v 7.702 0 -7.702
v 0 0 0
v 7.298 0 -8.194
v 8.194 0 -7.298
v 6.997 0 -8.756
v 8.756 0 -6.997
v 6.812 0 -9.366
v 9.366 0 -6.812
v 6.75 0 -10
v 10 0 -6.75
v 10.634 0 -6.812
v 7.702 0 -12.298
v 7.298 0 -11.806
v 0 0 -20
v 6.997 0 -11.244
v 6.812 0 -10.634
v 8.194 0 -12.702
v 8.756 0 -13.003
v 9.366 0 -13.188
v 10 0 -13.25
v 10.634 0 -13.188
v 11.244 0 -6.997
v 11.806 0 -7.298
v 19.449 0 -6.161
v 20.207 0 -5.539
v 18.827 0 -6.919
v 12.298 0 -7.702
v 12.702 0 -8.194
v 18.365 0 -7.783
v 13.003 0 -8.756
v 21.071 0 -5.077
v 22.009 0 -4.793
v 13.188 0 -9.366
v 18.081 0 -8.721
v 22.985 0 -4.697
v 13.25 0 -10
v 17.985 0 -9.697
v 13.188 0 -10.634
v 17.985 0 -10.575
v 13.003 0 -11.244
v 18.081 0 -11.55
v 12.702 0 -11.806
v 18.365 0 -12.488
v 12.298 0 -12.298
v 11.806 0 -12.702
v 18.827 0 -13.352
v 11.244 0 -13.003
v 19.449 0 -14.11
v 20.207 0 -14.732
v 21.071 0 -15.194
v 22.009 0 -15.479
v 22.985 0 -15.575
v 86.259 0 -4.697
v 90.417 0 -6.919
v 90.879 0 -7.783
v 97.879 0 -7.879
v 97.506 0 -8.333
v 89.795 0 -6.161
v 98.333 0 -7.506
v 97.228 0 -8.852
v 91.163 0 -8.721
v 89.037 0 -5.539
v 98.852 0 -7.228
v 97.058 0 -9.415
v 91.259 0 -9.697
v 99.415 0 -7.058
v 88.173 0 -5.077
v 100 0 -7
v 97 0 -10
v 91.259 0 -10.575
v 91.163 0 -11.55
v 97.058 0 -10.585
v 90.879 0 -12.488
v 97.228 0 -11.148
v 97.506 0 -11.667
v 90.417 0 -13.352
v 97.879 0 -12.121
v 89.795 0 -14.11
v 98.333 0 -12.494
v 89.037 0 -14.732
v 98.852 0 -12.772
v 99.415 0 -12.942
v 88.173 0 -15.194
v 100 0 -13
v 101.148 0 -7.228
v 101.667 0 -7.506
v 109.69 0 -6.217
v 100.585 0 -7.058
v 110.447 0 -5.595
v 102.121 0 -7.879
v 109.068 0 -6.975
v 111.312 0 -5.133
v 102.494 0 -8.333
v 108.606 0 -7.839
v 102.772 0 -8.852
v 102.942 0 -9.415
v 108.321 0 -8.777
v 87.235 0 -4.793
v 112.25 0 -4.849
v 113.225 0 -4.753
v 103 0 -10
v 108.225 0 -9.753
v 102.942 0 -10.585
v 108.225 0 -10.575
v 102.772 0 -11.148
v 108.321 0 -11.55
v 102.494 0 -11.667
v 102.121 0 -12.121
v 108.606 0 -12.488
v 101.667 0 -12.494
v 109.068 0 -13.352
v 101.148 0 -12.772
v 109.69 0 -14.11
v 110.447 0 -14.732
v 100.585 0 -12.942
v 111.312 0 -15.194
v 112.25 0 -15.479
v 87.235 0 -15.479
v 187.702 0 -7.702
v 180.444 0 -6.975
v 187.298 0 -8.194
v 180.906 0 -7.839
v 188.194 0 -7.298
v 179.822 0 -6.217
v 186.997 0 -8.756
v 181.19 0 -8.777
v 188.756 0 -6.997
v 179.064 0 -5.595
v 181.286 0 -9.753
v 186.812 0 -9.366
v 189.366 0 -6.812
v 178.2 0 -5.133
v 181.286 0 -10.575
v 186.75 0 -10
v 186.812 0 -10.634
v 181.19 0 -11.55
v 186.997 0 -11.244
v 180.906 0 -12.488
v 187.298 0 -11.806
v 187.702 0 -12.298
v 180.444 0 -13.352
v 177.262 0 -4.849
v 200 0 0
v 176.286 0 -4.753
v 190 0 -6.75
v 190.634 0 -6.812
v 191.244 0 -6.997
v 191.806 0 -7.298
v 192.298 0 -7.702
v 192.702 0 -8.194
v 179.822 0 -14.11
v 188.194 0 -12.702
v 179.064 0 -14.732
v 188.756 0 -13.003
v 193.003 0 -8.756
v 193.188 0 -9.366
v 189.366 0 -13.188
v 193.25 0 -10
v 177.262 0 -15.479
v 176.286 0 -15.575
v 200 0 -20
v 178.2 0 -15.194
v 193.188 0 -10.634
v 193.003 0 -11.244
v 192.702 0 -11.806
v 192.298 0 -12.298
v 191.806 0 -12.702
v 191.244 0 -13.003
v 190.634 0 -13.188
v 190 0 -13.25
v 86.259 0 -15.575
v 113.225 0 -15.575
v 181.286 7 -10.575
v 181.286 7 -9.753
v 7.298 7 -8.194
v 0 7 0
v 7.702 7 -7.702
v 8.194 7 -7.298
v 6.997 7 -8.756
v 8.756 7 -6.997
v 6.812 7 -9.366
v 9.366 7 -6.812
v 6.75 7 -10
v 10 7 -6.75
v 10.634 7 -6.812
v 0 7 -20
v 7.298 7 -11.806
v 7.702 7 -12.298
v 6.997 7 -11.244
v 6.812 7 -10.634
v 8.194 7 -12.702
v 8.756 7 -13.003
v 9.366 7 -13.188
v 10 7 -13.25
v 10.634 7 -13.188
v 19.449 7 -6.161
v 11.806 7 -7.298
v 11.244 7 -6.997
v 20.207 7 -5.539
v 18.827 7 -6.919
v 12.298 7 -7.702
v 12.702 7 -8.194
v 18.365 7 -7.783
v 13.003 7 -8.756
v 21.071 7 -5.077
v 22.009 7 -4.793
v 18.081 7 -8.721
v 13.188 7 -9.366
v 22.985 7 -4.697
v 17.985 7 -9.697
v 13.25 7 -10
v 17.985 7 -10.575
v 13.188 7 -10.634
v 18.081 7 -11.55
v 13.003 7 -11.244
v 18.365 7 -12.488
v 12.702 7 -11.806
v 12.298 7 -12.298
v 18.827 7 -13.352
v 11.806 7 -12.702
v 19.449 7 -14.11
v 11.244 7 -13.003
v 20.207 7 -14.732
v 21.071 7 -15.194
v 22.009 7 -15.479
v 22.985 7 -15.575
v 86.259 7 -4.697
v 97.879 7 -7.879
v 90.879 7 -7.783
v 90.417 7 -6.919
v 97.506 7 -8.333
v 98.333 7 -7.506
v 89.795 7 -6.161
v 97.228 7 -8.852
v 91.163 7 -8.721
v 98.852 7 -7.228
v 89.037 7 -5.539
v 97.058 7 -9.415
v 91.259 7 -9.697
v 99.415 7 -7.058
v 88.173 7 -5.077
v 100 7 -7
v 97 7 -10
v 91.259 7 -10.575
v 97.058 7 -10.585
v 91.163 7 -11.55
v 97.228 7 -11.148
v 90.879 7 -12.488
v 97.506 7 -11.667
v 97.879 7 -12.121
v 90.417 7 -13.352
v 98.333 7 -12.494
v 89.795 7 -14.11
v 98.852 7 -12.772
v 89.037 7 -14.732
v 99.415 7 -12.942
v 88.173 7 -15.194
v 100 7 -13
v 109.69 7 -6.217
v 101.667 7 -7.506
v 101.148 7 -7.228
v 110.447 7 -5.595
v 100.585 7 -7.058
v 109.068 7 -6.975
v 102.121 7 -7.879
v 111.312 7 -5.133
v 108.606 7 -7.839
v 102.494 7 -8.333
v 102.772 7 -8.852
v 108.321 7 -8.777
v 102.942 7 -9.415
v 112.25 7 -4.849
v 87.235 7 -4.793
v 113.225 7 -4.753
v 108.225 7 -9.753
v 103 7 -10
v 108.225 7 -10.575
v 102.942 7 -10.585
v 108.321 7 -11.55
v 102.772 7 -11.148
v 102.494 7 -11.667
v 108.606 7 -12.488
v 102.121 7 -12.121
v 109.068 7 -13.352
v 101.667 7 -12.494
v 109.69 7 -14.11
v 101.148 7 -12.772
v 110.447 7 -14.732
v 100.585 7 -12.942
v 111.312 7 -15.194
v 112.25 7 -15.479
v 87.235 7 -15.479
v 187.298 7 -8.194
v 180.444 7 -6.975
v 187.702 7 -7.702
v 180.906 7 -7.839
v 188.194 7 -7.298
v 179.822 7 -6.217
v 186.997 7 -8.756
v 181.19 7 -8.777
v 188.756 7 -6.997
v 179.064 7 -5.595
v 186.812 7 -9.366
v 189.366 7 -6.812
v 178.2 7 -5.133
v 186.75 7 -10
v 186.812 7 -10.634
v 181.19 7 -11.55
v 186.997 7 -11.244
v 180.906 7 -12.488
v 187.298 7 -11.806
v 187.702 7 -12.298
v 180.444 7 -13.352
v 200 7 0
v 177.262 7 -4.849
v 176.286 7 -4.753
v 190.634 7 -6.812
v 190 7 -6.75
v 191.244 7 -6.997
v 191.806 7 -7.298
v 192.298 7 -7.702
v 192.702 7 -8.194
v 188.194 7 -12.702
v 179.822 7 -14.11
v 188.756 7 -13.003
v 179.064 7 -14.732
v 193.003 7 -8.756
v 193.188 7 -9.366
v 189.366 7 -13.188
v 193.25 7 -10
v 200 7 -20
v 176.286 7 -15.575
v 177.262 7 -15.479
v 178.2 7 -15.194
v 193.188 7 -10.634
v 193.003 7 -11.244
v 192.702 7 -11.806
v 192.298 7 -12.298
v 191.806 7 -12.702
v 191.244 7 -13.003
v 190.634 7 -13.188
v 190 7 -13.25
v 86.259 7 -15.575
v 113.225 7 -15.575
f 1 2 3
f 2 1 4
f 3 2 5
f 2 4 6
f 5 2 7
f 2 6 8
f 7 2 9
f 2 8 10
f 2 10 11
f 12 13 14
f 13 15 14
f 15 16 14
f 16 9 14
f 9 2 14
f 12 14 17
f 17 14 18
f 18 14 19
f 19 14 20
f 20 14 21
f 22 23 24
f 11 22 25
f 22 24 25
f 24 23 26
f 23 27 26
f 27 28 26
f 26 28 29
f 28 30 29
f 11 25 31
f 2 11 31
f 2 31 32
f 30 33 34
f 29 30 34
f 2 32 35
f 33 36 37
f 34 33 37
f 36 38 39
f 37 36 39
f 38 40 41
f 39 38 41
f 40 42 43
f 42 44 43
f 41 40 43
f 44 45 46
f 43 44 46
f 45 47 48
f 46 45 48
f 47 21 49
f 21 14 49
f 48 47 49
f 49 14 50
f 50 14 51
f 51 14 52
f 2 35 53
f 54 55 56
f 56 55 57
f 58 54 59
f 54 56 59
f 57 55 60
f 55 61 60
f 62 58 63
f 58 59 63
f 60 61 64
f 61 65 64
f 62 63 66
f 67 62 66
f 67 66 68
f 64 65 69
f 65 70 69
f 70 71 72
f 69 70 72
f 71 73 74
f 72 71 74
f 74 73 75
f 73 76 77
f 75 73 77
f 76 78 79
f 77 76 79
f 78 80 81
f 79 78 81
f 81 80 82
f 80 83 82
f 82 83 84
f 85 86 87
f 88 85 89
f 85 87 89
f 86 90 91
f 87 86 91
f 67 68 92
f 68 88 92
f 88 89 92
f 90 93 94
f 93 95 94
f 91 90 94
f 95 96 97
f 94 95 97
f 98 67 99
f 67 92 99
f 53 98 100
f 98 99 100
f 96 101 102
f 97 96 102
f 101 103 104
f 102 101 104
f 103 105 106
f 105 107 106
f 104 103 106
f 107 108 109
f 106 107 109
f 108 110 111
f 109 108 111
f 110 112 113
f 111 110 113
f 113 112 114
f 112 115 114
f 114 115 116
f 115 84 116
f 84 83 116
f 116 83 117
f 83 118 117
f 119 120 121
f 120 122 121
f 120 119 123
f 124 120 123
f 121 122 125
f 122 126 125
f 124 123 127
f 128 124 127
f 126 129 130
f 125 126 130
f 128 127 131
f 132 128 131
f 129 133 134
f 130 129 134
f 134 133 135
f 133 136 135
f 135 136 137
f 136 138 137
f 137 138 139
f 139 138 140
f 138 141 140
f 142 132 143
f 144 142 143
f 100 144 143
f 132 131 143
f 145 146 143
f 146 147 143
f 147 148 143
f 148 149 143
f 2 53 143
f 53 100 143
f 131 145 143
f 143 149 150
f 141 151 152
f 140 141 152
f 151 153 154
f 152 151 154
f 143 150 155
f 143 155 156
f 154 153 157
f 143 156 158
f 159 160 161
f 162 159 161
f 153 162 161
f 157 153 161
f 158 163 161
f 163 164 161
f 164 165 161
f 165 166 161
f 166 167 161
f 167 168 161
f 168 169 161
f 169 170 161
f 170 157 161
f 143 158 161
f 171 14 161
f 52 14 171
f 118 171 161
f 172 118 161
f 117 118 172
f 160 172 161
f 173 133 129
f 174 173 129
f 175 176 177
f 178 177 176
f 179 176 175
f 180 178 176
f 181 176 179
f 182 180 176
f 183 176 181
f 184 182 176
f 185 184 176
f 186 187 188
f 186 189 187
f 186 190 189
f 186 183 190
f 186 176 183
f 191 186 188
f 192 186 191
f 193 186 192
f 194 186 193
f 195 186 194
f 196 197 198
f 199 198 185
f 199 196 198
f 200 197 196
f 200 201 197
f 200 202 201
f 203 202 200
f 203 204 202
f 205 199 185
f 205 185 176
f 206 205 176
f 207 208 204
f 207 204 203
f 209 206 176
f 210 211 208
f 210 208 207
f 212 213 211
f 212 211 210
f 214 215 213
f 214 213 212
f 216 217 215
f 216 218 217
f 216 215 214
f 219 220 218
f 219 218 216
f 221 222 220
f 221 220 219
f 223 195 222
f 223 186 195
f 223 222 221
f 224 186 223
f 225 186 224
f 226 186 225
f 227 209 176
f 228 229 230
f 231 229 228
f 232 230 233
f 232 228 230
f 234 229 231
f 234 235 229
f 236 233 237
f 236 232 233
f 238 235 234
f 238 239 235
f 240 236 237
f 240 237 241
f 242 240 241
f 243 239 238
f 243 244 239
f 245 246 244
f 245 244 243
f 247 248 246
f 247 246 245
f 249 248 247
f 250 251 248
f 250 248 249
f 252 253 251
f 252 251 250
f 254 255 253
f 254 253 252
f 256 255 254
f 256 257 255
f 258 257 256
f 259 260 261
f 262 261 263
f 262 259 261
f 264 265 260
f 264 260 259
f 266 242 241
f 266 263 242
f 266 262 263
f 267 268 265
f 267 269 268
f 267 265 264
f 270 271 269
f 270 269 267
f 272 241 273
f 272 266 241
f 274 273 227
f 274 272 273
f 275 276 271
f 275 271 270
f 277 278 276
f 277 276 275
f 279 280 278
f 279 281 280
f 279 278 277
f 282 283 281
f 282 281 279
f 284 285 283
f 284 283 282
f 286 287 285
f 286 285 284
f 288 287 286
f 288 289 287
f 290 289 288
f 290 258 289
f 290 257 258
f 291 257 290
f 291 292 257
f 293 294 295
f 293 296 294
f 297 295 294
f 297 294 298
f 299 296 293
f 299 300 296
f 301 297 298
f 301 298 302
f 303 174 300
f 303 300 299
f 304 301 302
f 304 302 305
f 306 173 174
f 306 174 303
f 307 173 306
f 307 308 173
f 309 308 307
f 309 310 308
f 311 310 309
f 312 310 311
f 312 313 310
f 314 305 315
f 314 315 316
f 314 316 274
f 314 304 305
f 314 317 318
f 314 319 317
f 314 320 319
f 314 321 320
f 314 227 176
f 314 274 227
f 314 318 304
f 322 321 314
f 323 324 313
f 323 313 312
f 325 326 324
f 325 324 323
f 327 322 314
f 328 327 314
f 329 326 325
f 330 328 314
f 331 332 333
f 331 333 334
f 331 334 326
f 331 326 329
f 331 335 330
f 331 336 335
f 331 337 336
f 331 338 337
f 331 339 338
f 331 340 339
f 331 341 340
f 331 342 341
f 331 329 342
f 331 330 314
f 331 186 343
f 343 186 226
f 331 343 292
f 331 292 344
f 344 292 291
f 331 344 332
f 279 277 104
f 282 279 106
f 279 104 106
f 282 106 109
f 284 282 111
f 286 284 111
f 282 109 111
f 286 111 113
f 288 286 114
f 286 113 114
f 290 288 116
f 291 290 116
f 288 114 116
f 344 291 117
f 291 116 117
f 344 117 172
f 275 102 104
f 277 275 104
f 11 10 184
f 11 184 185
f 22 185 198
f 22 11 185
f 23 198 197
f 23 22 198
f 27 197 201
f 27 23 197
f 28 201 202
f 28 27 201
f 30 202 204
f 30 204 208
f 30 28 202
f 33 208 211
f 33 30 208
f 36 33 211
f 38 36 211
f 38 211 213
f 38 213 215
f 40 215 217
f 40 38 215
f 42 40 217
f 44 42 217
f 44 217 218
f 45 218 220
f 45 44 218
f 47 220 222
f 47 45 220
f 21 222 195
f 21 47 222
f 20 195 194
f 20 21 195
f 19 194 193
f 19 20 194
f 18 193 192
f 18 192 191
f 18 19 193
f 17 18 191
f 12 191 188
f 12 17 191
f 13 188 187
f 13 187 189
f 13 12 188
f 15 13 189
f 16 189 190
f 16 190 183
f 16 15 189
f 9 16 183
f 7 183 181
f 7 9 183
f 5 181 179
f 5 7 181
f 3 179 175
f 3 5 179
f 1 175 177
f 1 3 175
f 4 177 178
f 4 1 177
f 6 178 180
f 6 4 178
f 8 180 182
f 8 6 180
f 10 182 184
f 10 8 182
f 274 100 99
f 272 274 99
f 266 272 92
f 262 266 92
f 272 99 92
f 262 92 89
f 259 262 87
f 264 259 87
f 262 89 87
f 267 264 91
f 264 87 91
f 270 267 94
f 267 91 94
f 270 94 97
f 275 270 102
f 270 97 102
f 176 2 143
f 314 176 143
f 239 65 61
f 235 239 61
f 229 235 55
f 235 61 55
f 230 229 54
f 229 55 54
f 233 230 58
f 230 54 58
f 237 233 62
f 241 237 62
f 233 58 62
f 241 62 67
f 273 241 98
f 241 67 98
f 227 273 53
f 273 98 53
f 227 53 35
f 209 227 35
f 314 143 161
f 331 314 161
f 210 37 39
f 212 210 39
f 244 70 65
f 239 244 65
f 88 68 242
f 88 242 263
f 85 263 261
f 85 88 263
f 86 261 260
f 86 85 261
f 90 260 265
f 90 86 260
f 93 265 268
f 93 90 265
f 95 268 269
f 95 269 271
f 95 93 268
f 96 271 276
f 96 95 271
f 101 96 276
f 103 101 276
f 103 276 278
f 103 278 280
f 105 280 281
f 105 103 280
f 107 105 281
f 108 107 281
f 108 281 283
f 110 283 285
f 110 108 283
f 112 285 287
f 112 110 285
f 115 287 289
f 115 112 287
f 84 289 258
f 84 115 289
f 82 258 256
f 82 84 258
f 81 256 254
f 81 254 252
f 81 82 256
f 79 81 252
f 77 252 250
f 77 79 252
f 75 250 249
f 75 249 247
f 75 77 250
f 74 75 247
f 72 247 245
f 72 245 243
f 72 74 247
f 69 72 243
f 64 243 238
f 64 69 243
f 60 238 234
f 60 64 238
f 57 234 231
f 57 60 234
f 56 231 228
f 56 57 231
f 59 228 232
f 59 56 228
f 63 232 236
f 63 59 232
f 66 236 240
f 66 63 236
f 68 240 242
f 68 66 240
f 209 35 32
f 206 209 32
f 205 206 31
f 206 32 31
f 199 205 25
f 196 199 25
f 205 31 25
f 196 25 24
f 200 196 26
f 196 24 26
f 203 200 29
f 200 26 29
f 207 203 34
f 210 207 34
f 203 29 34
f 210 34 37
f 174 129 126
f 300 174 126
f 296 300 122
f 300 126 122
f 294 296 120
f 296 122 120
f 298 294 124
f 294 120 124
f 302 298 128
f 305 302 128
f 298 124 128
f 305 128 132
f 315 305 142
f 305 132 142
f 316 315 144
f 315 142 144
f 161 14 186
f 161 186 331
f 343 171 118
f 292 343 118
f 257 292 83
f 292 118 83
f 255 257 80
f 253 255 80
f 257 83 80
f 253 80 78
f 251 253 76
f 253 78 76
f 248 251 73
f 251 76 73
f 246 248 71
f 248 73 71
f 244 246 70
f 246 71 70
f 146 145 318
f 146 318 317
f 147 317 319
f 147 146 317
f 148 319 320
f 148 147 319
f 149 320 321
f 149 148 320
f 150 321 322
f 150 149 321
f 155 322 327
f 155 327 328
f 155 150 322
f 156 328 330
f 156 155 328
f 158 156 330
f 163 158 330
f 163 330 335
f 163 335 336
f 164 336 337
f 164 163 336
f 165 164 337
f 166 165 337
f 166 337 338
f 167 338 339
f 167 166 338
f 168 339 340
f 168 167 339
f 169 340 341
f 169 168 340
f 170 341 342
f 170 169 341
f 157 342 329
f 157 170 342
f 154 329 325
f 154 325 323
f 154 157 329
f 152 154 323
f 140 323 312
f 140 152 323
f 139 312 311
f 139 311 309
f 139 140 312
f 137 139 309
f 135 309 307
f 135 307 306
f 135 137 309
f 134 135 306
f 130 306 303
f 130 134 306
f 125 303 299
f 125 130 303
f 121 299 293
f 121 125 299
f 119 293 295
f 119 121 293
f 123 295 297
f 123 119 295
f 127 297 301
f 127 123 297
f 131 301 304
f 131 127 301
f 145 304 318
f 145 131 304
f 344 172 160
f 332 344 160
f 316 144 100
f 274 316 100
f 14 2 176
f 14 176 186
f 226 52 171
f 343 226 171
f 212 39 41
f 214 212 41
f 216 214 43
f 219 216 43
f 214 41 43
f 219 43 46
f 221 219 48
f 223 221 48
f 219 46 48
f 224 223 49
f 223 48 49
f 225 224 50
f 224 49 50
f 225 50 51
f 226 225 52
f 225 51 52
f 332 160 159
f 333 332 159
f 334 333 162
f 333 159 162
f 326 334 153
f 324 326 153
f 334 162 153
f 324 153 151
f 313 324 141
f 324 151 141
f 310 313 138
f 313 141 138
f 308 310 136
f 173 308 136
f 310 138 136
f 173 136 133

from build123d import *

# Parameters (mm, degrees)
SZKIC1_W                    = 200
SZKIC1_H                    = 20
SZKIC1_R                    = 3
SZKIC1_R_2                  = 3.25
DODANIE_WYCI_GNI_CIE1_DEPTH = 7


with BuildPart() as part:
    # Szkic1 → Dodanie-wyciągnięcie1 (new body)
    with BuildSketch(Plane(origin=(0, 0, 0), x_dir=(1, 0, 0), z_dir=(0, 1, 0))):
        with Locations((100, 10)):
            Rectangle(SZKIC1_W, SZKIC1_H)
        with Locations(Location((100, 10, 0), (0, 0, 270))):
            Circle(SZKIC1_R, mode=Mode.SUBTRACT)
        with Locations(Location((10, 10, 0), (0, 0, 270))):
            Circle(SZKIC1_R_2, mode=Mode.SUBTRACT)
        with Locations(Location((190, 10, 0), (0, 0, 270))):
            Circle(SZKIC1_R_2, mode=Mode.SUBTRACT)
        with BuildLine():
            Line((22.984822323, 15.57457628), (86.25939238, 15.57457628))
            ThreePointArc((86.25939238, 15.57457628), (89.794926286, 14.110110186), (91.25939238, 10.57457628))
            Line((91.25939238, 10.57457628), (91.25939238, 9.696719379))
            ThreePointArc((91.25939238, 9.696719379), (89.794926286, 6.161185473), (86.25939238, 4.696719379))
            Line((86.25939238, 4.696719379), (22.984822323, 4.696719379))
            ThreePointArc((22.984822323, 4.696719379), (19.449288417, 6.161185473), (17.984822323, 9.696719379))
            Line((17.984822323, 9.696719379), (17.984822323, 10.57457628))
            ThreePointArc((17.984822323, 10.57457628), (19.449288417, 14.110110186), (22.984822323, 15.57457628))
        make_face(mode=Mode.SUBTRACT)
        with BuildLine():
            Line((113.225148066, 15.57457628), (176.286209663, 15.57457628))
            ThreePointArc((176.286209663, 15.57457628), (179.821743569, 14.110110186), (181.286209663, 10.57457628))
            Line((181.286209663, 10.57457628), (181.286209663, 9.752776346))
            ThreePointArc((181.286209663, 9.752776346), (179.821743569, 6.21724244), (176.286209663, 4.752776346))
            Line((176.286209663, 4.752776346), (113.225148066, 4.752776346))
            ThreePointArc((113.225148066, 4.752776346), (109.68961416, 6.21724244), (108.225148066, 9.752776346))
            Line((108.225148066, 9.752776346), (108.225148066, 10.57457628))
            ThreePointArc((108.225148066, 10.57457628), (109.68961416, 14.110110186), (113.225148066, 15.57457628))
        make_face(mode=Mode.SUBTRACT)
    extrude(amount=DODANIE_WYCI_GNI_CIE1_DEPTH)


solid = part.part
